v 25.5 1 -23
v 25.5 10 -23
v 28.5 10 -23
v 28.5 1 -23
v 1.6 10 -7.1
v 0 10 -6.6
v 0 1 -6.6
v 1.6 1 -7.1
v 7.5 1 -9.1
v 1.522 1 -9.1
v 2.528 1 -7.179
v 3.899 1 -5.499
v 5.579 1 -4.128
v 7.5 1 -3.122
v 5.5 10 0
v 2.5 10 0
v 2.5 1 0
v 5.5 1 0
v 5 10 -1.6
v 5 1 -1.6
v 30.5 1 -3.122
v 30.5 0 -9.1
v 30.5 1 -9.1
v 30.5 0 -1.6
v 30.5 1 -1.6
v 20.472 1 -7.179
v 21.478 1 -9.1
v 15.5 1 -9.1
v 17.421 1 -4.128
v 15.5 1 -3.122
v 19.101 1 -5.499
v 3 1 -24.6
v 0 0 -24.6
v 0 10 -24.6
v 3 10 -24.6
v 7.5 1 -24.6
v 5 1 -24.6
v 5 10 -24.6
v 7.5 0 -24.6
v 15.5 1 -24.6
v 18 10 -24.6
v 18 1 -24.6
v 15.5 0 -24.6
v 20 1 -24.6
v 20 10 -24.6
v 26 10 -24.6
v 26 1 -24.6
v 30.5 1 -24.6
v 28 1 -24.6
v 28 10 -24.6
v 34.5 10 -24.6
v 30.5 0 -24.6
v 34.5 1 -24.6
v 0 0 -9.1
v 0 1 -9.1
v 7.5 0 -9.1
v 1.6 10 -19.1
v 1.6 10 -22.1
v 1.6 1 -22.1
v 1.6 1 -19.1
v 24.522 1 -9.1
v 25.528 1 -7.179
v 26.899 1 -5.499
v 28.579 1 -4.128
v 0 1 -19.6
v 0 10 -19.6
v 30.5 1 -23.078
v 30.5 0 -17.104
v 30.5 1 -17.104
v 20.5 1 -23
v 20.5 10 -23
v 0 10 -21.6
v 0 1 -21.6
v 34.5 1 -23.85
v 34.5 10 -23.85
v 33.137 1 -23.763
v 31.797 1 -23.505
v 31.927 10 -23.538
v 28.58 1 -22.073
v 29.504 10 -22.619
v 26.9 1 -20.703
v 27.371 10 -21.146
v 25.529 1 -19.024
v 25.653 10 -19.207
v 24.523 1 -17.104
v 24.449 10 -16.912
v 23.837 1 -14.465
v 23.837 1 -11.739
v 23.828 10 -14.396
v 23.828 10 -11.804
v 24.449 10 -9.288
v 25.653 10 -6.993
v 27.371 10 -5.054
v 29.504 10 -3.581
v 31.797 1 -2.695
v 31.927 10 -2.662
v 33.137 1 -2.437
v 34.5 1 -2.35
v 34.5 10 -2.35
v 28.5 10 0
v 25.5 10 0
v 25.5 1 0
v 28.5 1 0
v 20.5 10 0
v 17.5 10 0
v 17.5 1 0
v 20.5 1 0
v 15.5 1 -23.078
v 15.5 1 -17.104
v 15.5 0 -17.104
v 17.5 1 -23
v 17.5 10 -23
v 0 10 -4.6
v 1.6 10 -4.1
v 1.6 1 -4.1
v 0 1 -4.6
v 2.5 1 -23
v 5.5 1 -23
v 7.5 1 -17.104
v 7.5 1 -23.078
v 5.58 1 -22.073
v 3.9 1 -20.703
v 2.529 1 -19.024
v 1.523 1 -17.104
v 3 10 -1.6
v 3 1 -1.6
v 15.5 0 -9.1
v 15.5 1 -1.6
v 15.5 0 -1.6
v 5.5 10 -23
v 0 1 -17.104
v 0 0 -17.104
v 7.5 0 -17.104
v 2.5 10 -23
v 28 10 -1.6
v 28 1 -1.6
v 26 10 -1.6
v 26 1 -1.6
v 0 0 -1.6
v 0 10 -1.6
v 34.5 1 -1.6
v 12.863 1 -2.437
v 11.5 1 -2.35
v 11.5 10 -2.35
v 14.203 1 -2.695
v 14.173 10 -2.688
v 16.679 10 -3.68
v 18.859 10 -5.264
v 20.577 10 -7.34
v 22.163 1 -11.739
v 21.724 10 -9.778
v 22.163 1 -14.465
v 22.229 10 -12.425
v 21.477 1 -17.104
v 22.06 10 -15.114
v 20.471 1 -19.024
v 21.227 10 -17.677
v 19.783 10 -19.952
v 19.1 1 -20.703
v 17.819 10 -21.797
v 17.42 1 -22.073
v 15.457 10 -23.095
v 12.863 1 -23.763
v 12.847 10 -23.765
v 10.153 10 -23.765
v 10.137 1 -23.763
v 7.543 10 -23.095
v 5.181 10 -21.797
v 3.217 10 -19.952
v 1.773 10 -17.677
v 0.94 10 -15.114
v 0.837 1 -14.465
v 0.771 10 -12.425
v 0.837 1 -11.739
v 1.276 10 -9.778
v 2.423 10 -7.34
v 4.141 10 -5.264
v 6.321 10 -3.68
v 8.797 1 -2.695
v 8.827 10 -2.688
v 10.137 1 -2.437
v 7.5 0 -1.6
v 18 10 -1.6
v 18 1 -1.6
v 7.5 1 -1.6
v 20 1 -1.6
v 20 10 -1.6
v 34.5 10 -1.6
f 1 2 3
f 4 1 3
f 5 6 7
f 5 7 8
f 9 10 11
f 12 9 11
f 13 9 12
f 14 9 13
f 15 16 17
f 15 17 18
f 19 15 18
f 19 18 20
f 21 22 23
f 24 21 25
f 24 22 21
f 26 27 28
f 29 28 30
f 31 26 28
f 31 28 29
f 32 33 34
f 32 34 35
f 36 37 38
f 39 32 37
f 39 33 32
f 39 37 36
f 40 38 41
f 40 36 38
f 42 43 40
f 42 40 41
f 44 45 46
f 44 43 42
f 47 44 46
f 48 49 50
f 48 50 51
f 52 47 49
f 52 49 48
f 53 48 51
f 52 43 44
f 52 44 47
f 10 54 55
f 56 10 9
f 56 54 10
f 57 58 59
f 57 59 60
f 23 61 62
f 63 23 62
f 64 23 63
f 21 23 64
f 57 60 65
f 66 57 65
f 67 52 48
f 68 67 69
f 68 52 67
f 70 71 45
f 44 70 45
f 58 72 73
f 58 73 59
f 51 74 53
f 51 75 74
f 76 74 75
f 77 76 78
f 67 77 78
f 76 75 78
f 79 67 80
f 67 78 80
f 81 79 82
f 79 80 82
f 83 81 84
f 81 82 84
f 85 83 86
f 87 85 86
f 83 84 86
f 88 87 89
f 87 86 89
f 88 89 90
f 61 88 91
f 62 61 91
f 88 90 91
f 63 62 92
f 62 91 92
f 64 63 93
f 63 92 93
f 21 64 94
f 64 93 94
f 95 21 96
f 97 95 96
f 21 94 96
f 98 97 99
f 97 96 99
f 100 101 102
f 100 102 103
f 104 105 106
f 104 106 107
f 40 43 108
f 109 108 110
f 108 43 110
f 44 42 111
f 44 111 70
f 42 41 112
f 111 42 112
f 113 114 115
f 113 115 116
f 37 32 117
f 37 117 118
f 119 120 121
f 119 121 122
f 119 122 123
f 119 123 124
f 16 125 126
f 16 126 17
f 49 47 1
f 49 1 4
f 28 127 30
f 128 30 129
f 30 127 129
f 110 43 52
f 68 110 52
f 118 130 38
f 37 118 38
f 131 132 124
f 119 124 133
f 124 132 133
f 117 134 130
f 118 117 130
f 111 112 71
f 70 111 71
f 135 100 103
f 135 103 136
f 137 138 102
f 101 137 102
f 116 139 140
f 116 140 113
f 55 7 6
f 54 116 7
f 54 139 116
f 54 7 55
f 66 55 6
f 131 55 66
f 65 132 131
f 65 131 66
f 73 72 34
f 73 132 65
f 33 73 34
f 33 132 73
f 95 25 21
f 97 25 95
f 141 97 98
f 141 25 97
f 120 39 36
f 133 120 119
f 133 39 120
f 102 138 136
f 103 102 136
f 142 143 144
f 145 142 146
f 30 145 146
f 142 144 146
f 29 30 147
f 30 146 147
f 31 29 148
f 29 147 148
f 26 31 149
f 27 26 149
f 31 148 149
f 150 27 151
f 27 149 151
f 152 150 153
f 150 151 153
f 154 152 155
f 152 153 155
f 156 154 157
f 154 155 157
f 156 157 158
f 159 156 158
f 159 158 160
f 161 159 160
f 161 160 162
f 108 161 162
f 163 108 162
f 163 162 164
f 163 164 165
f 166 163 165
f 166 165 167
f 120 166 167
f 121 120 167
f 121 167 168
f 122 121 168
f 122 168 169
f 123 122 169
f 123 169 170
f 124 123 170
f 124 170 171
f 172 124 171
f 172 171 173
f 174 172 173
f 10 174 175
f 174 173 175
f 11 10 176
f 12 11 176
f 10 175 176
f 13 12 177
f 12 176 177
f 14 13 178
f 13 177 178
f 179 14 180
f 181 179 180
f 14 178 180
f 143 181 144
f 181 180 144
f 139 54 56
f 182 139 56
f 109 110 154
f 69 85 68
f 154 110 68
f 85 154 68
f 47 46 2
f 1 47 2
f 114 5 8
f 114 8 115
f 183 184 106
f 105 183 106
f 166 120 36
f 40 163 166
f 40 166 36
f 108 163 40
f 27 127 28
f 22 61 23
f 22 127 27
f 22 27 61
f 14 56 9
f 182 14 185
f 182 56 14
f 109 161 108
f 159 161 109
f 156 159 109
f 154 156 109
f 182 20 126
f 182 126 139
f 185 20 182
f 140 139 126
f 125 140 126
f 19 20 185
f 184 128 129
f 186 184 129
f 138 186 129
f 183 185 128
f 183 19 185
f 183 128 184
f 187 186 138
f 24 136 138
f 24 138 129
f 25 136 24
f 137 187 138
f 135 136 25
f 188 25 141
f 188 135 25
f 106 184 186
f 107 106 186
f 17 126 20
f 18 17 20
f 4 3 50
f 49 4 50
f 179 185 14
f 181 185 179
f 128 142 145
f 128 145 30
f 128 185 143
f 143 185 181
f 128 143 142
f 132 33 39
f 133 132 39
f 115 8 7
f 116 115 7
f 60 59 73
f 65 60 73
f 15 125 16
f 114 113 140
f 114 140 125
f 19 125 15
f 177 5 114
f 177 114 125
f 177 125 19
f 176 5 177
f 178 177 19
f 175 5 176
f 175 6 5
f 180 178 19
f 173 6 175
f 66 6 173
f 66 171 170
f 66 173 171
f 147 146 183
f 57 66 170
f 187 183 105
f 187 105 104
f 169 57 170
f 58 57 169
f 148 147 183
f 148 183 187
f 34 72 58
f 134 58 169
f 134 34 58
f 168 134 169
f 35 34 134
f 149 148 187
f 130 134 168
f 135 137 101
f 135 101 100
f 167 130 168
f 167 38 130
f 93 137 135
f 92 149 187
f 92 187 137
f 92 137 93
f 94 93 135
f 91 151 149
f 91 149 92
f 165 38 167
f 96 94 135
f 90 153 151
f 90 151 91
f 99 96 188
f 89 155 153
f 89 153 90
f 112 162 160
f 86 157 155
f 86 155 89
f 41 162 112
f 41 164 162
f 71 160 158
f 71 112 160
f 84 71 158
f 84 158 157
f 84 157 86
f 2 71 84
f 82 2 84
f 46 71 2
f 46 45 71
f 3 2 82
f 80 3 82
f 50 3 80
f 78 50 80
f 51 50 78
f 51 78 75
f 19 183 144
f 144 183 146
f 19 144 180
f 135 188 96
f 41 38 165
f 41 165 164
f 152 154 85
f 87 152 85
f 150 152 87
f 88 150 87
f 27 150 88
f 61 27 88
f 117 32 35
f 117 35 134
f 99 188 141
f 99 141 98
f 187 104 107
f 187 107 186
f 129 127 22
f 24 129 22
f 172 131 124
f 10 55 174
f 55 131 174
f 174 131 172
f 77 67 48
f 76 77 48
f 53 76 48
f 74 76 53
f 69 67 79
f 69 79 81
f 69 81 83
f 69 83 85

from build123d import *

# Parameters (mm, degrees)
SKETCH1_W           = 47.6
SKETCH1_H           = 24.6
BOSS_EXTRUDE1_DEPTH = 10
SKETCH2_R           = 10.75
CUT_EXTRUDE1_DEPTH  = 9
CUT_EXTRUDE2_DEPTH  = 9
SKETCH5_W           = 1.6
SKETCH5_H           = 24.6
CUT_EXTRUDE3_DEPTH  = 10
SKETCH6_W           = 46
SKETCH6_H           = 1.6
CUT_EXTRUDE4_DEPTH  = 10
BOSS_EXTRUDE2_DEPTH = 9
SKETCH10_W          = 46
SKETCH10_H          = 8.003908937
CUT_EXTRUDE5_DEPTH  = 1
SKETCH11_W          = 8
SKETCH11_H          = 23
CUT_EXTRUDE6_DEPTH  = 1
SKETCH12_W          = 13.355704333
SKETCH12_H          = 24.6
CUT_EXTRUDE8_DEPTH  = 10


with BuildPart() as part:
    # Sketch1 → Boss-Extrude1 (new body)
    with BuildSketch(Plane(origin=(0, 0, 0), x_dir=(1, 0, 0), z_dir=(0, 1, 0))):
        with Locations((23.8, 12.3)):
            Rectangle(SKETCH1_W, SKETCH1_H)
    extrude(amount=BOSS_EXTRUDE1_DEPTH)

    # Sketch2 → Cut-Extrude1 (cut)
    with BuildSketch(Plane(origin=(0, 10, 0), x_dir=(1, 0, 0), z_dir=(0, 1, 0))):
        with Locations(Location((11.5, 13.1, 0), (0, 0, 270))):
            Circle(SKETCH2_R)
        with Locations(Location((34.5, 13.1, 0), (0, 0, 270))):
            Circle(SKETCH2_R)
    extrude(amount=-CUT_EXTRUDE1_DEPTH, mode=Mode.SUBTRACT)

    # Sketch3 → Cut-Extrude2 (cut)
    with BuildSketch(Plane(origin=(0, 10, 0), x_dir=(1, 0, 0), z_dir=(0, 1, 0))):
        Polygon((3, 24.6), (2.5, 23), (5.5, 23), (5, 24.6), align=None)
        Polygon((18, 24.6), (17.5, 23), (20.5, 23), (20, 24.6), align=None)
        Polygon((26, 24.6), (25.5, 23), (28.5, 23), (28, 24.6), align=None)
        Polygon((41, 24.6), (40.5, 23), (43.5, 23), (43, 24.6), align=None)
        Polygon((0, 21.6), (1.6, 22.1), (1.6, 19.1), (0, 19.6), align=None)
        Polygon((0, 6.6), (1.6, 7.1), (1.6, 4.1), (0, 4.6), align=None)
    extrude(amount=-CUT_EXTRUDE2_DEPTH, mode=Mode.SUBTRACT)

    # Sketch5 → Cut-Extrude3 (cut)
    with BuildSketch(Plane(origin=(0, 10, 0), x_dir=(1, 0, 0), z_dir=(0, 1, 0))):
        with Locations((46.8, 12.3)):
            Rectangle(SKETCH5_W, SKETCH5_H)
    extrude(amount=-CUT_EXTRUDE3_DEPTH, mode=Mode.SUBTRACT)

    # Sketch6 → Cut-Extrude4 (cut)
    with BuildSketch(Plane(origin=(0, 10, 0), x_dir=(1, 0, 0), z_dir=(0, 1, 0))):
        with Locations((23, 0.8)):
            Rectangle(SKETCH6_W, SKETCH6_H)
    extrude(amount=-CUT_EXTRUDE4_DEPTH, mode=Mode.SUBTRACT)

    # Sketch7 → Boss-Extrude2 (add)
    with BuildSketch(Plane(origin=(0, 10, 0), x_dir=(1, 0, 0), z_dir=(0, 1, 0))):
        Polygon((46, 21.6), (47.6, 22.1), (47.6, 19.1), (46, 19.6), align=None)
        Polygon((46, 6.6), (47.6, 7.1), (47.6, 4.1), (46, 4.6), align=None)
        Polygon((3, 1.6), (2.5, 0), (5.5, 0), (5, 1.6), align=None)
        Polygon((18, 1.6), (17.5, 0), (20.5, 0), (20, 1.6), align=None)
        Polygon((26, 1.6), (25.5, 0), (28.5, 0), (28, 1.6), align=None)
        Polygon((41, 1.6), (40.5, 0), (43.5, 0), (43, 1.6), align=None)
    extrude(amount=-BOSS_EXTRUDE2_DEPTH)

    # Sketch10 → Cut-Extrude5 (cut)
    with BuildSketch(Plane.XZ):
        with Locations((23, -13.101954469)):
            Rectangle(SKETCH10_W, SKETCH10_H)
    extrude(amount=-CUT_EXTRUDE5_DEPTH, mode=Mode.SUBTRACT)

    # Sketch11 → Cut-Extrude6 (cut)
    with BuildSketch(Plane.XZ):
        with Locations((11.5, -13.1)):
            Rectangle(SKETCH11_W, SKETCH11_H)
        with Locations((34.5, -13.1)):
            Rectangle(SKETCH11_W, SKETCH11_H)
    extrude(amount=-CUT_EXTRUDE6_DEPTH, mode=Mode.SUBTRACT)

    # Sketch12 → Cut-Extrude8 (cut)
    with BuildSketch(Plane(origin=(0, 10, 0), x_dir=(1, 0, 0), z_dir=(0, 1, 0))):
        with Locations((41.177852167, 12.3)):
            Rectangle(SKETCH12_W, SKETCH12_H)
    extrude(amount=-CUT_EXTRUDE8_DEPTH, mode=Mode.SUBTRACT)


solid = part.part
